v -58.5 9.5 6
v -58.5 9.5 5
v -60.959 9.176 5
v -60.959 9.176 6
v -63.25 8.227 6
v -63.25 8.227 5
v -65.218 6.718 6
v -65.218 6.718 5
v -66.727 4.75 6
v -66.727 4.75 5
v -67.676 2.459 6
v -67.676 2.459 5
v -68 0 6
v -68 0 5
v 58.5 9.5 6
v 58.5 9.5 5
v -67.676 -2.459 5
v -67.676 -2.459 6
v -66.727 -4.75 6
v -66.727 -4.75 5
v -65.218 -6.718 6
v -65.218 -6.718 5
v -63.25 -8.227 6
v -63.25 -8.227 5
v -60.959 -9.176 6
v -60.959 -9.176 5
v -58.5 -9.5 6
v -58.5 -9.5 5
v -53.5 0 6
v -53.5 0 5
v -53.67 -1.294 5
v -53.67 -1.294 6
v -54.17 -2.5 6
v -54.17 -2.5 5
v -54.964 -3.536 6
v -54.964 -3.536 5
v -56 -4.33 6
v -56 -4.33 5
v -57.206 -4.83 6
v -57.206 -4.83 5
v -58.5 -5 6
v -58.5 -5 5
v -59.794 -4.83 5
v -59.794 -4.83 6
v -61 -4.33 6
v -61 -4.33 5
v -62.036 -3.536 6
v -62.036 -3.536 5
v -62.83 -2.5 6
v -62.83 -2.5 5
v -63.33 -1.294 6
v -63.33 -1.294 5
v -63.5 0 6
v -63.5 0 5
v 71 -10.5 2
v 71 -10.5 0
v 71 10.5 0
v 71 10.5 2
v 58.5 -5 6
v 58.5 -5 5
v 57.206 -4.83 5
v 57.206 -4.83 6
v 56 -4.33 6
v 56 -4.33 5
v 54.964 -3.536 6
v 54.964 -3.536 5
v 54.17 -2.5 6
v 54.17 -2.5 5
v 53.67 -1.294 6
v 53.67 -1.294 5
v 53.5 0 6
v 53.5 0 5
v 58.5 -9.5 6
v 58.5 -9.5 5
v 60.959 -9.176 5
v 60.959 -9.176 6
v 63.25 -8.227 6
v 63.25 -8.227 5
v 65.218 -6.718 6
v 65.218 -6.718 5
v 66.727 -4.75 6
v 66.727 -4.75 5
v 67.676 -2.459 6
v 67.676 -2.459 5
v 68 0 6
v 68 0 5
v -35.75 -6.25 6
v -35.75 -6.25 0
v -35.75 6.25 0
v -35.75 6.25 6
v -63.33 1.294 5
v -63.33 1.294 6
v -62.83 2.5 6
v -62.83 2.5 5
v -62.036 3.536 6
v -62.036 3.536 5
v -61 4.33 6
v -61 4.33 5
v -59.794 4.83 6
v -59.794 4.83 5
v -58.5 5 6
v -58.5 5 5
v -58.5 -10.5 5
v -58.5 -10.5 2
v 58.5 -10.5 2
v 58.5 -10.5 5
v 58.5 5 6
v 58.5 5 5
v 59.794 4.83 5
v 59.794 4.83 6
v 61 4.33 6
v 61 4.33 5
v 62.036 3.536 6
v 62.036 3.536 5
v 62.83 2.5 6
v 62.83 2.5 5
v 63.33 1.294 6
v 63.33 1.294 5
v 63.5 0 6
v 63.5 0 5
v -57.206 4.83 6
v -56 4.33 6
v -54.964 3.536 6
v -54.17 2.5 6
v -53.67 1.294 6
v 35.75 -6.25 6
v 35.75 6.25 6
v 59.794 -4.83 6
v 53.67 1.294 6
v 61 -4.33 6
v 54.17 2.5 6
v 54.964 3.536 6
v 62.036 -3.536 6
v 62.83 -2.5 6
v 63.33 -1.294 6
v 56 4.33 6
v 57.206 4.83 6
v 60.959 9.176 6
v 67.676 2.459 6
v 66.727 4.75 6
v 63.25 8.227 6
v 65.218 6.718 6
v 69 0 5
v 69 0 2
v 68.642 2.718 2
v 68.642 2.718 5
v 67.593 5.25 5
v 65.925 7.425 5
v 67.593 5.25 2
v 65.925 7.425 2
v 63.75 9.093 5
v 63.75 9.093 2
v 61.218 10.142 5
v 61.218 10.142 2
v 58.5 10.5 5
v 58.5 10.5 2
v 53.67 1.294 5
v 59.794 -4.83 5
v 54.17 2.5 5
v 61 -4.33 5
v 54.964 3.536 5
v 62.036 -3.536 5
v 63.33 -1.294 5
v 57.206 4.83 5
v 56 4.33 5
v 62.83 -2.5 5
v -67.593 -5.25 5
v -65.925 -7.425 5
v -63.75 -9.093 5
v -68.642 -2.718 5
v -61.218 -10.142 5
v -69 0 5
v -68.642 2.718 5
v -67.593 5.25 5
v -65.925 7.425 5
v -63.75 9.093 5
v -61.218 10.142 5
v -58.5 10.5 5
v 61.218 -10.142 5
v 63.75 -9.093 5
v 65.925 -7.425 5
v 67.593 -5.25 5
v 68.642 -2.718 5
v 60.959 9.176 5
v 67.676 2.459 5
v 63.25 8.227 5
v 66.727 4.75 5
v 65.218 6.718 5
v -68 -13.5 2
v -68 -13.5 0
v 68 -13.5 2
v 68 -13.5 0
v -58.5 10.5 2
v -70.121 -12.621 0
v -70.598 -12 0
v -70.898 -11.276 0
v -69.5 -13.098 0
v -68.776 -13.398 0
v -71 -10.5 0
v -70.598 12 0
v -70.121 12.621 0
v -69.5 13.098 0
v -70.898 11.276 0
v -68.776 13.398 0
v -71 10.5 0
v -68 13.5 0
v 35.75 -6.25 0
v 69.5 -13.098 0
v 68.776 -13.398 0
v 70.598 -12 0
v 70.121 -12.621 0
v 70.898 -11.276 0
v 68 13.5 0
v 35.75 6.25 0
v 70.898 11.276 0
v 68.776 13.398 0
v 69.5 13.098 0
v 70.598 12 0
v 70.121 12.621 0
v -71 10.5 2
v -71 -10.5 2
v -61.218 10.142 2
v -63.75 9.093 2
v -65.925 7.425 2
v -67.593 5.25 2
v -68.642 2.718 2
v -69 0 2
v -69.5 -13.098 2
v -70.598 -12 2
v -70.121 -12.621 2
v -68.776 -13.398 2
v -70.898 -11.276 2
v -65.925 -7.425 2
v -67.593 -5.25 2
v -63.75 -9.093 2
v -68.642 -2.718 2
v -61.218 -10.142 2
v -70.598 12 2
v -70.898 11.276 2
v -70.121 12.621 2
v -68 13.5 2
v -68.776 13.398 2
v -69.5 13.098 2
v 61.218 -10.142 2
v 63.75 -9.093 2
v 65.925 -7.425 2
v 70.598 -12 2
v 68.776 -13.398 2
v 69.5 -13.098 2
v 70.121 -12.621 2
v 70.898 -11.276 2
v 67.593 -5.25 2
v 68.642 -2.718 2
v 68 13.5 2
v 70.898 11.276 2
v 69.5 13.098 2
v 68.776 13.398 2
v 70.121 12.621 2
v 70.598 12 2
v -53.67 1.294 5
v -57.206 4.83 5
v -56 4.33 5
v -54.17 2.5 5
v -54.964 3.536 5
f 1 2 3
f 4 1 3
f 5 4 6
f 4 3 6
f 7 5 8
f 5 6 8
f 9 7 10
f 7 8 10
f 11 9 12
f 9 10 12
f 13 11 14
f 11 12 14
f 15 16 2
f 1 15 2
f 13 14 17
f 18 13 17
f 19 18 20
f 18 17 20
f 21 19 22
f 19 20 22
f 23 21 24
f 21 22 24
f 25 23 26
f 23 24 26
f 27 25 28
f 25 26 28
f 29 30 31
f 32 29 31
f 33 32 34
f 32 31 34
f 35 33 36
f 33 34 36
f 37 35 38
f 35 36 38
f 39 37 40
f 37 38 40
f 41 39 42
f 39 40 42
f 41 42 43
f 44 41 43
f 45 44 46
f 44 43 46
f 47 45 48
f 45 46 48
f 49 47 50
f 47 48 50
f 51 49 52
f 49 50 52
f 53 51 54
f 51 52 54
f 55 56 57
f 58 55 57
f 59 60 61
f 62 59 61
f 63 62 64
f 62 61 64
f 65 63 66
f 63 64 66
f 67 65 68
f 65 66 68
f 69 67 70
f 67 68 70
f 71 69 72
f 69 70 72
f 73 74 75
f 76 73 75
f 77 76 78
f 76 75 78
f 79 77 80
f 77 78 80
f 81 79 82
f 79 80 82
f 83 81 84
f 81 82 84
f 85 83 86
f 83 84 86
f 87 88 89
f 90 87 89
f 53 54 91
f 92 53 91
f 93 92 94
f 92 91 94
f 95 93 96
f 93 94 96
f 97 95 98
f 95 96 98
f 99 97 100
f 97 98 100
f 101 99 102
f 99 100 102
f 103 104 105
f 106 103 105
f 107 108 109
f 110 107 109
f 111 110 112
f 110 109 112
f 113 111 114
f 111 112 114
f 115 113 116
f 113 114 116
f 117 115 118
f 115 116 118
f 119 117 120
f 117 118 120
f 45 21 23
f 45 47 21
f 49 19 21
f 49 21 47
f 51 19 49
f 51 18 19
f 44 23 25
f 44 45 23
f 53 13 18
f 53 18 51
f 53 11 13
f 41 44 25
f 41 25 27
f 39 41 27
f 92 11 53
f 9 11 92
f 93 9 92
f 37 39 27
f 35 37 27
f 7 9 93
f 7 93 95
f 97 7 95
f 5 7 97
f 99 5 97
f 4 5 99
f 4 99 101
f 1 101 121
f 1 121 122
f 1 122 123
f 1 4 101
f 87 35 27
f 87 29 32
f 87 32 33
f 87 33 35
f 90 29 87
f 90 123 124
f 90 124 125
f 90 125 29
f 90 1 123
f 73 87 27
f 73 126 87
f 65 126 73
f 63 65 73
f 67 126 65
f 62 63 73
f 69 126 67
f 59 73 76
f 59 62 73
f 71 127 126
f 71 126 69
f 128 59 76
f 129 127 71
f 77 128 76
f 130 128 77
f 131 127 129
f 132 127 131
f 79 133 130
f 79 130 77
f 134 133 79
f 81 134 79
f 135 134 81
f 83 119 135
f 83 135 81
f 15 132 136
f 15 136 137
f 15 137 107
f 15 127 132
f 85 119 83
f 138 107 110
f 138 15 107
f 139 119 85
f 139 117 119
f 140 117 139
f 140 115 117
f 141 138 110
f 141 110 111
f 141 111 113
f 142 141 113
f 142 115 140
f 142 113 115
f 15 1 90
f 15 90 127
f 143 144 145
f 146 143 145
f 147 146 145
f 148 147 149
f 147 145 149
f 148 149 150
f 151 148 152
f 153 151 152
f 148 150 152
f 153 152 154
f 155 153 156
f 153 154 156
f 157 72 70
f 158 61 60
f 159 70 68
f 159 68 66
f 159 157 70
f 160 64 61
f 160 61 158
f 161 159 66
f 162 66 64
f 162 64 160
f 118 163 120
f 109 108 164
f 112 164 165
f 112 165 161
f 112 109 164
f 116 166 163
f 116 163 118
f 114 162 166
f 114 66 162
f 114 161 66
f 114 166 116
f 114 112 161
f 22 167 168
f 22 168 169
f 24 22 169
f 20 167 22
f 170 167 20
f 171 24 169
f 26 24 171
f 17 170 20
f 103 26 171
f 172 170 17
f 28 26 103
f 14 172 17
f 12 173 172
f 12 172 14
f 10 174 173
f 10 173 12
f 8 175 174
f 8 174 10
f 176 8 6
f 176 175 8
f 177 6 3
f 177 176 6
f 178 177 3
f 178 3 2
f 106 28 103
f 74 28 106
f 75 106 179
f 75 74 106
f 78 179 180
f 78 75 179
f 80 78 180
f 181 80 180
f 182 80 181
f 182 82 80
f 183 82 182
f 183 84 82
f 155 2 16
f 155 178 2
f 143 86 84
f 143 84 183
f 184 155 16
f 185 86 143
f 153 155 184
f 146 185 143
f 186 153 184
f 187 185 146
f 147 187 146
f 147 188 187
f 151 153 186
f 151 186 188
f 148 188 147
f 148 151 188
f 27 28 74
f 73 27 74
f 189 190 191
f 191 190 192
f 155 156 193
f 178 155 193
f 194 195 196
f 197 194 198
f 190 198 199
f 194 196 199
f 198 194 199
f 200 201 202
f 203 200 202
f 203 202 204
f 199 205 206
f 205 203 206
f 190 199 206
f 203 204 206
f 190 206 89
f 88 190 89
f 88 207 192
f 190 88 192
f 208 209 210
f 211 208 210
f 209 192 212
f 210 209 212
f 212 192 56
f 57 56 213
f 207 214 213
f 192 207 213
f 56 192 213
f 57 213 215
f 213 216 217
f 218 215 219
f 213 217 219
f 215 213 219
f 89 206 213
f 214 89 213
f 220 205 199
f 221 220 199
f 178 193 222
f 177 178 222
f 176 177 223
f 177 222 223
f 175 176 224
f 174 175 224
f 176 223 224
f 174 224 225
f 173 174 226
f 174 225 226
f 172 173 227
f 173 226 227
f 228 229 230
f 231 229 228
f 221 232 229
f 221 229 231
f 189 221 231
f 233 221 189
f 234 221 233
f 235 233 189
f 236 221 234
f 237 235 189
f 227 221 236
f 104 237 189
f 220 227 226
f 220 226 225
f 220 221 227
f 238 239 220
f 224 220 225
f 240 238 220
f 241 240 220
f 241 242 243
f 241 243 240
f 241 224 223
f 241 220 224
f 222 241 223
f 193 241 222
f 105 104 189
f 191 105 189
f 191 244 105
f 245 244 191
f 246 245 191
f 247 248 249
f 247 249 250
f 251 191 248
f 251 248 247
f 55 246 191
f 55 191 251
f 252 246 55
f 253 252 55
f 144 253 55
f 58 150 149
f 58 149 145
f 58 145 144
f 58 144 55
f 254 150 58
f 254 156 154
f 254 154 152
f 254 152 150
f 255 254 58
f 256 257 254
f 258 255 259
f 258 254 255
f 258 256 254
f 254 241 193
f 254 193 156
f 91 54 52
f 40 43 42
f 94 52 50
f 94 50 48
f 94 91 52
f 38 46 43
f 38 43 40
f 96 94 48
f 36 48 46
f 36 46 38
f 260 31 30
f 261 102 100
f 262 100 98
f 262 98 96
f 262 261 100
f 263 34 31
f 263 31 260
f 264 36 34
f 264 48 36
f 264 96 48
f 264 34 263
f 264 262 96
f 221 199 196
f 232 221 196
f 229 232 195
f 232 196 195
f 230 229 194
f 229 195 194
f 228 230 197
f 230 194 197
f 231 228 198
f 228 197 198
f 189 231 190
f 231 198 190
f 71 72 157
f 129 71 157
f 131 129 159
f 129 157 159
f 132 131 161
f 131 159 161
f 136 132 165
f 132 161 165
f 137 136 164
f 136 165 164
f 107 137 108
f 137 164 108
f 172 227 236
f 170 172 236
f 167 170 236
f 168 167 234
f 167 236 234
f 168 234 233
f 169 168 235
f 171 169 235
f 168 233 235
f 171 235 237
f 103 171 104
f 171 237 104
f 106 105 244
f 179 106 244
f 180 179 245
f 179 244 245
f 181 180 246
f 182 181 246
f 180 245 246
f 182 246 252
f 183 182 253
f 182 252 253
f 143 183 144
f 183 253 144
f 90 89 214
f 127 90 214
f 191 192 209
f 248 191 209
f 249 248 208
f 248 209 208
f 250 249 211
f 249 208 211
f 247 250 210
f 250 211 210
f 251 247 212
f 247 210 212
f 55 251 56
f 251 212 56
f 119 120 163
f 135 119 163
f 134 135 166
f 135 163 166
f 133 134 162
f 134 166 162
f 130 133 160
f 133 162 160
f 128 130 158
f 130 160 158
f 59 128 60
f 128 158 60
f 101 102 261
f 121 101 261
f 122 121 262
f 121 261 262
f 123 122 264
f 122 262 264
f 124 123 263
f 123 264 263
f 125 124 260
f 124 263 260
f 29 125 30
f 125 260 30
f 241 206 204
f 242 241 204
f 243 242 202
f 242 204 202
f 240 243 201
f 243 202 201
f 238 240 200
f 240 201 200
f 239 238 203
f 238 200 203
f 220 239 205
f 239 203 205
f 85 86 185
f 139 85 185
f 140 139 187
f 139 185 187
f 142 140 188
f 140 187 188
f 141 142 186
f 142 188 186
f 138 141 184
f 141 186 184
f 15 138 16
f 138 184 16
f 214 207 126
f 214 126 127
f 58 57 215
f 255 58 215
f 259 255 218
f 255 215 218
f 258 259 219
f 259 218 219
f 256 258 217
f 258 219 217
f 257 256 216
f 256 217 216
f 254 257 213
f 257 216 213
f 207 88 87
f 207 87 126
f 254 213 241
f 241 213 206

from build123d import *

# Parameters (mm, degrees)
F1_DEPTH = 2
F0_W     = 71.5
F0_H     = 12.5
F2_DEPTH = 6
F3_DEPTH = 5
F4_DEPTH = 5


with BuildPart() as f1:
    # F0 (on Top) → F1 (new body)
    with BuildSketch(Plane.XY):
        with BuildLine():
            Line((-71, 10.5), (-71, -10.5))
            ThreePointArc((-71, -10.5), (-70.1213203436, -12.6213203436), (-68, -13.5))
            Line((-68, -13.5), (68, -13.5))
            ThreePointArc((68, -13.5), (70.1213203436, -12.6213203436), (71, -10.5))
            Line((71, -10.5), (71, 10.5))
            ThreePointArc((71, 10.5), (70.1213203436, 12.6213203436), (68, 13.5))
            Line((68, 13.5), (-68, 13.5))
            ThreePointArc((-68, 13.5), (-70.1213203436, 12.6213203436), (-71, 10.5))
        make_face()
        with BuildLine():
            Line((58.5, -10.5), (-58.5, -10.5))
            ThreePointArc((-58.5, -10.5), (-65.9246212025, -7.4246212025), (-69, 0))
            ThreePointArc((-69, 0), (-65.9246212025, 7.4246212025), (-58.5, 10.5))
            Line((-58.5, 10.5), (58.5, 10.5))
            ThreePointArc((58.5, 10.5), (65.9246212025, 7.4246212025), (69, 0))
            ThreePointArc((69, 0), (65.9246212025, -7.4246212025), (58.5, -10.5))
        make_face(mode=Mode.SUBTRACT)
    extrude(amount=F1_DEPTH)



with BuildPart() as f2:
    # F0 (on Top) → F2 (new body)
    with BuildSketch(Plane.XY):
        with BuildLine():
            ThreePointArc((-68, 0), (-65.2175144213, -6.7175144213), (-58.5, -9.5))
            Line((-58.5, -9.5), (58.5, -9.5))
            ThreePointArc((58.5, -9.5), (65.2175144213, -6.7175144213), (68, 0))
            ThreePointArc((68, 0), (65.2175144213, 6.7175144213), (58.5, 9.5))
            Line((58.5, 9.5), (-58.5, 9.5))
            ThreePointArc((-58.5, 9.5), (-65.2175144213, 6.7175144213), (-68, 0))
        make_face()
        with BuildLine():
            ThreePointArc((-63.5, 0), (-62.0355339059, 3.5355339059), (-58.5, 5))
            ThreePointArc((-58.5, 5), (-54.9644660941, 3.5355339059), (-53.5, 0))
            ThreePointArc((-53.5, 0), (-54.9644660941, -3.5355339059), (-58.5, -5))
            ThreePointArc((-58.5, -5), (-62.0355339059, -3.5355339059), (-63.5, 0))
        make_face(mode=Mode.SUBTRACT)
        Rectangle(F0_W, F0_H, mode=Mode.SUBTRACT)
        with BuildLine():
            ThreePointArc((53.5, 0), (54.9644660941, 3.5355339059), (58.5, 5))
            ThreePointArc((58.5, 5), (62.0355339059, 3.5355339059), (63.5, 0))
            ThreePointArc((63.5, 0), (62.0355339059, -3.5355339059), (58.5, -5))
            ThreePointArc((58.5, -5), (54.9644660941, -3.5355339059), (53.5, 0))
        make_face(mode=Mode.SUBTRACT)
    extrude(amount=F2_DEPTH)


with BuildPart() as f1_1:
    add(f1.part)

    add(f2.part)  # F3 merges F2
    # F0 (on Top) → F3 (join)
    with BuildSketch(Plane.XY):
        with BuildLine():
            ThreePointArc((-69, 0), (-65.9246212025, -7.4246212025), (-58.5, -10.5))
            Line((-58.5, -10.5), (58.5, -10.5))
            ThreePointArc((58.5, -10.5), (65.9246212025, -7.4246212025), (69, 0))
            ThreePointArc((69, 0), (65.9246212025, 7.4246212025), (58.5, 10.5))
            Line((58.5, 10.5), (-58.5, 10.5))
            ThreePointArc((-58.5, 10.5), (-65.9246212025, 7.4246212025), (-69, 0))
        make_face()
        with BuildLine():
            Line((58.5, -9.5), (-58.5, -9.5))
            ThreePointArc((-58.5, -9.5), (-65.2175144213, -6.7175144213), (-68, 0))
            ThreePointArc((-68, 0), (-65.2175144213, 6.7175144213), (-58.5, 9.5))
            Line((-58.5, 9.5), (58.5, 9.5))
            ThreePointArc((58.5, 9.5), (65.2175144213, 6.7175144213), (68, 0))
            ThreePointArc((68, 0), (65.2175144213, -6.7175144213), (58.5, -9.5))
        make_face(mode=Mode.SUBTRACT)
    extrude(amount=F3_DEPTH)

    # F0 (on Top) → F4 (join)
    with BuildSketch(Plane.XY):
        with BuildLine():
            ThreePointArc((-53.5, 0), (-54.9644660941, 3.5355339059), (-58.5, 5))
            ThreePointArc((-58.5, 5), (-62.0355339059, 3.5355339059), (-63.5, 0))
            ThreePointArc((-63.5, 0), (-62.0355339059, -3.5355339059), (-58.5, -5))
            ThreePointArc((-58.5, -5), (-54.9644660941, -3.5355339059), (-53.5, 0))
        make_face()
        with BuildLine():
            ThreePointArc((63.5, 0), (62.0355339059, 3.5355339059), (58.5, 5))
            ThreePointArc((58.5, 5), (54.9644660941, 3.5355339059), (53.5, 0))
            ThreePointArc((53.5, 0), (54.9644660941, -3.5355339059), (58.5, -5))
            ThreePointArc((58.5, -5), (62.0355339059, -3.5355339059), (63.5, 0))
        make_face()
    extrude(amount=F4_DEPTH)


solid = f1_1.part
